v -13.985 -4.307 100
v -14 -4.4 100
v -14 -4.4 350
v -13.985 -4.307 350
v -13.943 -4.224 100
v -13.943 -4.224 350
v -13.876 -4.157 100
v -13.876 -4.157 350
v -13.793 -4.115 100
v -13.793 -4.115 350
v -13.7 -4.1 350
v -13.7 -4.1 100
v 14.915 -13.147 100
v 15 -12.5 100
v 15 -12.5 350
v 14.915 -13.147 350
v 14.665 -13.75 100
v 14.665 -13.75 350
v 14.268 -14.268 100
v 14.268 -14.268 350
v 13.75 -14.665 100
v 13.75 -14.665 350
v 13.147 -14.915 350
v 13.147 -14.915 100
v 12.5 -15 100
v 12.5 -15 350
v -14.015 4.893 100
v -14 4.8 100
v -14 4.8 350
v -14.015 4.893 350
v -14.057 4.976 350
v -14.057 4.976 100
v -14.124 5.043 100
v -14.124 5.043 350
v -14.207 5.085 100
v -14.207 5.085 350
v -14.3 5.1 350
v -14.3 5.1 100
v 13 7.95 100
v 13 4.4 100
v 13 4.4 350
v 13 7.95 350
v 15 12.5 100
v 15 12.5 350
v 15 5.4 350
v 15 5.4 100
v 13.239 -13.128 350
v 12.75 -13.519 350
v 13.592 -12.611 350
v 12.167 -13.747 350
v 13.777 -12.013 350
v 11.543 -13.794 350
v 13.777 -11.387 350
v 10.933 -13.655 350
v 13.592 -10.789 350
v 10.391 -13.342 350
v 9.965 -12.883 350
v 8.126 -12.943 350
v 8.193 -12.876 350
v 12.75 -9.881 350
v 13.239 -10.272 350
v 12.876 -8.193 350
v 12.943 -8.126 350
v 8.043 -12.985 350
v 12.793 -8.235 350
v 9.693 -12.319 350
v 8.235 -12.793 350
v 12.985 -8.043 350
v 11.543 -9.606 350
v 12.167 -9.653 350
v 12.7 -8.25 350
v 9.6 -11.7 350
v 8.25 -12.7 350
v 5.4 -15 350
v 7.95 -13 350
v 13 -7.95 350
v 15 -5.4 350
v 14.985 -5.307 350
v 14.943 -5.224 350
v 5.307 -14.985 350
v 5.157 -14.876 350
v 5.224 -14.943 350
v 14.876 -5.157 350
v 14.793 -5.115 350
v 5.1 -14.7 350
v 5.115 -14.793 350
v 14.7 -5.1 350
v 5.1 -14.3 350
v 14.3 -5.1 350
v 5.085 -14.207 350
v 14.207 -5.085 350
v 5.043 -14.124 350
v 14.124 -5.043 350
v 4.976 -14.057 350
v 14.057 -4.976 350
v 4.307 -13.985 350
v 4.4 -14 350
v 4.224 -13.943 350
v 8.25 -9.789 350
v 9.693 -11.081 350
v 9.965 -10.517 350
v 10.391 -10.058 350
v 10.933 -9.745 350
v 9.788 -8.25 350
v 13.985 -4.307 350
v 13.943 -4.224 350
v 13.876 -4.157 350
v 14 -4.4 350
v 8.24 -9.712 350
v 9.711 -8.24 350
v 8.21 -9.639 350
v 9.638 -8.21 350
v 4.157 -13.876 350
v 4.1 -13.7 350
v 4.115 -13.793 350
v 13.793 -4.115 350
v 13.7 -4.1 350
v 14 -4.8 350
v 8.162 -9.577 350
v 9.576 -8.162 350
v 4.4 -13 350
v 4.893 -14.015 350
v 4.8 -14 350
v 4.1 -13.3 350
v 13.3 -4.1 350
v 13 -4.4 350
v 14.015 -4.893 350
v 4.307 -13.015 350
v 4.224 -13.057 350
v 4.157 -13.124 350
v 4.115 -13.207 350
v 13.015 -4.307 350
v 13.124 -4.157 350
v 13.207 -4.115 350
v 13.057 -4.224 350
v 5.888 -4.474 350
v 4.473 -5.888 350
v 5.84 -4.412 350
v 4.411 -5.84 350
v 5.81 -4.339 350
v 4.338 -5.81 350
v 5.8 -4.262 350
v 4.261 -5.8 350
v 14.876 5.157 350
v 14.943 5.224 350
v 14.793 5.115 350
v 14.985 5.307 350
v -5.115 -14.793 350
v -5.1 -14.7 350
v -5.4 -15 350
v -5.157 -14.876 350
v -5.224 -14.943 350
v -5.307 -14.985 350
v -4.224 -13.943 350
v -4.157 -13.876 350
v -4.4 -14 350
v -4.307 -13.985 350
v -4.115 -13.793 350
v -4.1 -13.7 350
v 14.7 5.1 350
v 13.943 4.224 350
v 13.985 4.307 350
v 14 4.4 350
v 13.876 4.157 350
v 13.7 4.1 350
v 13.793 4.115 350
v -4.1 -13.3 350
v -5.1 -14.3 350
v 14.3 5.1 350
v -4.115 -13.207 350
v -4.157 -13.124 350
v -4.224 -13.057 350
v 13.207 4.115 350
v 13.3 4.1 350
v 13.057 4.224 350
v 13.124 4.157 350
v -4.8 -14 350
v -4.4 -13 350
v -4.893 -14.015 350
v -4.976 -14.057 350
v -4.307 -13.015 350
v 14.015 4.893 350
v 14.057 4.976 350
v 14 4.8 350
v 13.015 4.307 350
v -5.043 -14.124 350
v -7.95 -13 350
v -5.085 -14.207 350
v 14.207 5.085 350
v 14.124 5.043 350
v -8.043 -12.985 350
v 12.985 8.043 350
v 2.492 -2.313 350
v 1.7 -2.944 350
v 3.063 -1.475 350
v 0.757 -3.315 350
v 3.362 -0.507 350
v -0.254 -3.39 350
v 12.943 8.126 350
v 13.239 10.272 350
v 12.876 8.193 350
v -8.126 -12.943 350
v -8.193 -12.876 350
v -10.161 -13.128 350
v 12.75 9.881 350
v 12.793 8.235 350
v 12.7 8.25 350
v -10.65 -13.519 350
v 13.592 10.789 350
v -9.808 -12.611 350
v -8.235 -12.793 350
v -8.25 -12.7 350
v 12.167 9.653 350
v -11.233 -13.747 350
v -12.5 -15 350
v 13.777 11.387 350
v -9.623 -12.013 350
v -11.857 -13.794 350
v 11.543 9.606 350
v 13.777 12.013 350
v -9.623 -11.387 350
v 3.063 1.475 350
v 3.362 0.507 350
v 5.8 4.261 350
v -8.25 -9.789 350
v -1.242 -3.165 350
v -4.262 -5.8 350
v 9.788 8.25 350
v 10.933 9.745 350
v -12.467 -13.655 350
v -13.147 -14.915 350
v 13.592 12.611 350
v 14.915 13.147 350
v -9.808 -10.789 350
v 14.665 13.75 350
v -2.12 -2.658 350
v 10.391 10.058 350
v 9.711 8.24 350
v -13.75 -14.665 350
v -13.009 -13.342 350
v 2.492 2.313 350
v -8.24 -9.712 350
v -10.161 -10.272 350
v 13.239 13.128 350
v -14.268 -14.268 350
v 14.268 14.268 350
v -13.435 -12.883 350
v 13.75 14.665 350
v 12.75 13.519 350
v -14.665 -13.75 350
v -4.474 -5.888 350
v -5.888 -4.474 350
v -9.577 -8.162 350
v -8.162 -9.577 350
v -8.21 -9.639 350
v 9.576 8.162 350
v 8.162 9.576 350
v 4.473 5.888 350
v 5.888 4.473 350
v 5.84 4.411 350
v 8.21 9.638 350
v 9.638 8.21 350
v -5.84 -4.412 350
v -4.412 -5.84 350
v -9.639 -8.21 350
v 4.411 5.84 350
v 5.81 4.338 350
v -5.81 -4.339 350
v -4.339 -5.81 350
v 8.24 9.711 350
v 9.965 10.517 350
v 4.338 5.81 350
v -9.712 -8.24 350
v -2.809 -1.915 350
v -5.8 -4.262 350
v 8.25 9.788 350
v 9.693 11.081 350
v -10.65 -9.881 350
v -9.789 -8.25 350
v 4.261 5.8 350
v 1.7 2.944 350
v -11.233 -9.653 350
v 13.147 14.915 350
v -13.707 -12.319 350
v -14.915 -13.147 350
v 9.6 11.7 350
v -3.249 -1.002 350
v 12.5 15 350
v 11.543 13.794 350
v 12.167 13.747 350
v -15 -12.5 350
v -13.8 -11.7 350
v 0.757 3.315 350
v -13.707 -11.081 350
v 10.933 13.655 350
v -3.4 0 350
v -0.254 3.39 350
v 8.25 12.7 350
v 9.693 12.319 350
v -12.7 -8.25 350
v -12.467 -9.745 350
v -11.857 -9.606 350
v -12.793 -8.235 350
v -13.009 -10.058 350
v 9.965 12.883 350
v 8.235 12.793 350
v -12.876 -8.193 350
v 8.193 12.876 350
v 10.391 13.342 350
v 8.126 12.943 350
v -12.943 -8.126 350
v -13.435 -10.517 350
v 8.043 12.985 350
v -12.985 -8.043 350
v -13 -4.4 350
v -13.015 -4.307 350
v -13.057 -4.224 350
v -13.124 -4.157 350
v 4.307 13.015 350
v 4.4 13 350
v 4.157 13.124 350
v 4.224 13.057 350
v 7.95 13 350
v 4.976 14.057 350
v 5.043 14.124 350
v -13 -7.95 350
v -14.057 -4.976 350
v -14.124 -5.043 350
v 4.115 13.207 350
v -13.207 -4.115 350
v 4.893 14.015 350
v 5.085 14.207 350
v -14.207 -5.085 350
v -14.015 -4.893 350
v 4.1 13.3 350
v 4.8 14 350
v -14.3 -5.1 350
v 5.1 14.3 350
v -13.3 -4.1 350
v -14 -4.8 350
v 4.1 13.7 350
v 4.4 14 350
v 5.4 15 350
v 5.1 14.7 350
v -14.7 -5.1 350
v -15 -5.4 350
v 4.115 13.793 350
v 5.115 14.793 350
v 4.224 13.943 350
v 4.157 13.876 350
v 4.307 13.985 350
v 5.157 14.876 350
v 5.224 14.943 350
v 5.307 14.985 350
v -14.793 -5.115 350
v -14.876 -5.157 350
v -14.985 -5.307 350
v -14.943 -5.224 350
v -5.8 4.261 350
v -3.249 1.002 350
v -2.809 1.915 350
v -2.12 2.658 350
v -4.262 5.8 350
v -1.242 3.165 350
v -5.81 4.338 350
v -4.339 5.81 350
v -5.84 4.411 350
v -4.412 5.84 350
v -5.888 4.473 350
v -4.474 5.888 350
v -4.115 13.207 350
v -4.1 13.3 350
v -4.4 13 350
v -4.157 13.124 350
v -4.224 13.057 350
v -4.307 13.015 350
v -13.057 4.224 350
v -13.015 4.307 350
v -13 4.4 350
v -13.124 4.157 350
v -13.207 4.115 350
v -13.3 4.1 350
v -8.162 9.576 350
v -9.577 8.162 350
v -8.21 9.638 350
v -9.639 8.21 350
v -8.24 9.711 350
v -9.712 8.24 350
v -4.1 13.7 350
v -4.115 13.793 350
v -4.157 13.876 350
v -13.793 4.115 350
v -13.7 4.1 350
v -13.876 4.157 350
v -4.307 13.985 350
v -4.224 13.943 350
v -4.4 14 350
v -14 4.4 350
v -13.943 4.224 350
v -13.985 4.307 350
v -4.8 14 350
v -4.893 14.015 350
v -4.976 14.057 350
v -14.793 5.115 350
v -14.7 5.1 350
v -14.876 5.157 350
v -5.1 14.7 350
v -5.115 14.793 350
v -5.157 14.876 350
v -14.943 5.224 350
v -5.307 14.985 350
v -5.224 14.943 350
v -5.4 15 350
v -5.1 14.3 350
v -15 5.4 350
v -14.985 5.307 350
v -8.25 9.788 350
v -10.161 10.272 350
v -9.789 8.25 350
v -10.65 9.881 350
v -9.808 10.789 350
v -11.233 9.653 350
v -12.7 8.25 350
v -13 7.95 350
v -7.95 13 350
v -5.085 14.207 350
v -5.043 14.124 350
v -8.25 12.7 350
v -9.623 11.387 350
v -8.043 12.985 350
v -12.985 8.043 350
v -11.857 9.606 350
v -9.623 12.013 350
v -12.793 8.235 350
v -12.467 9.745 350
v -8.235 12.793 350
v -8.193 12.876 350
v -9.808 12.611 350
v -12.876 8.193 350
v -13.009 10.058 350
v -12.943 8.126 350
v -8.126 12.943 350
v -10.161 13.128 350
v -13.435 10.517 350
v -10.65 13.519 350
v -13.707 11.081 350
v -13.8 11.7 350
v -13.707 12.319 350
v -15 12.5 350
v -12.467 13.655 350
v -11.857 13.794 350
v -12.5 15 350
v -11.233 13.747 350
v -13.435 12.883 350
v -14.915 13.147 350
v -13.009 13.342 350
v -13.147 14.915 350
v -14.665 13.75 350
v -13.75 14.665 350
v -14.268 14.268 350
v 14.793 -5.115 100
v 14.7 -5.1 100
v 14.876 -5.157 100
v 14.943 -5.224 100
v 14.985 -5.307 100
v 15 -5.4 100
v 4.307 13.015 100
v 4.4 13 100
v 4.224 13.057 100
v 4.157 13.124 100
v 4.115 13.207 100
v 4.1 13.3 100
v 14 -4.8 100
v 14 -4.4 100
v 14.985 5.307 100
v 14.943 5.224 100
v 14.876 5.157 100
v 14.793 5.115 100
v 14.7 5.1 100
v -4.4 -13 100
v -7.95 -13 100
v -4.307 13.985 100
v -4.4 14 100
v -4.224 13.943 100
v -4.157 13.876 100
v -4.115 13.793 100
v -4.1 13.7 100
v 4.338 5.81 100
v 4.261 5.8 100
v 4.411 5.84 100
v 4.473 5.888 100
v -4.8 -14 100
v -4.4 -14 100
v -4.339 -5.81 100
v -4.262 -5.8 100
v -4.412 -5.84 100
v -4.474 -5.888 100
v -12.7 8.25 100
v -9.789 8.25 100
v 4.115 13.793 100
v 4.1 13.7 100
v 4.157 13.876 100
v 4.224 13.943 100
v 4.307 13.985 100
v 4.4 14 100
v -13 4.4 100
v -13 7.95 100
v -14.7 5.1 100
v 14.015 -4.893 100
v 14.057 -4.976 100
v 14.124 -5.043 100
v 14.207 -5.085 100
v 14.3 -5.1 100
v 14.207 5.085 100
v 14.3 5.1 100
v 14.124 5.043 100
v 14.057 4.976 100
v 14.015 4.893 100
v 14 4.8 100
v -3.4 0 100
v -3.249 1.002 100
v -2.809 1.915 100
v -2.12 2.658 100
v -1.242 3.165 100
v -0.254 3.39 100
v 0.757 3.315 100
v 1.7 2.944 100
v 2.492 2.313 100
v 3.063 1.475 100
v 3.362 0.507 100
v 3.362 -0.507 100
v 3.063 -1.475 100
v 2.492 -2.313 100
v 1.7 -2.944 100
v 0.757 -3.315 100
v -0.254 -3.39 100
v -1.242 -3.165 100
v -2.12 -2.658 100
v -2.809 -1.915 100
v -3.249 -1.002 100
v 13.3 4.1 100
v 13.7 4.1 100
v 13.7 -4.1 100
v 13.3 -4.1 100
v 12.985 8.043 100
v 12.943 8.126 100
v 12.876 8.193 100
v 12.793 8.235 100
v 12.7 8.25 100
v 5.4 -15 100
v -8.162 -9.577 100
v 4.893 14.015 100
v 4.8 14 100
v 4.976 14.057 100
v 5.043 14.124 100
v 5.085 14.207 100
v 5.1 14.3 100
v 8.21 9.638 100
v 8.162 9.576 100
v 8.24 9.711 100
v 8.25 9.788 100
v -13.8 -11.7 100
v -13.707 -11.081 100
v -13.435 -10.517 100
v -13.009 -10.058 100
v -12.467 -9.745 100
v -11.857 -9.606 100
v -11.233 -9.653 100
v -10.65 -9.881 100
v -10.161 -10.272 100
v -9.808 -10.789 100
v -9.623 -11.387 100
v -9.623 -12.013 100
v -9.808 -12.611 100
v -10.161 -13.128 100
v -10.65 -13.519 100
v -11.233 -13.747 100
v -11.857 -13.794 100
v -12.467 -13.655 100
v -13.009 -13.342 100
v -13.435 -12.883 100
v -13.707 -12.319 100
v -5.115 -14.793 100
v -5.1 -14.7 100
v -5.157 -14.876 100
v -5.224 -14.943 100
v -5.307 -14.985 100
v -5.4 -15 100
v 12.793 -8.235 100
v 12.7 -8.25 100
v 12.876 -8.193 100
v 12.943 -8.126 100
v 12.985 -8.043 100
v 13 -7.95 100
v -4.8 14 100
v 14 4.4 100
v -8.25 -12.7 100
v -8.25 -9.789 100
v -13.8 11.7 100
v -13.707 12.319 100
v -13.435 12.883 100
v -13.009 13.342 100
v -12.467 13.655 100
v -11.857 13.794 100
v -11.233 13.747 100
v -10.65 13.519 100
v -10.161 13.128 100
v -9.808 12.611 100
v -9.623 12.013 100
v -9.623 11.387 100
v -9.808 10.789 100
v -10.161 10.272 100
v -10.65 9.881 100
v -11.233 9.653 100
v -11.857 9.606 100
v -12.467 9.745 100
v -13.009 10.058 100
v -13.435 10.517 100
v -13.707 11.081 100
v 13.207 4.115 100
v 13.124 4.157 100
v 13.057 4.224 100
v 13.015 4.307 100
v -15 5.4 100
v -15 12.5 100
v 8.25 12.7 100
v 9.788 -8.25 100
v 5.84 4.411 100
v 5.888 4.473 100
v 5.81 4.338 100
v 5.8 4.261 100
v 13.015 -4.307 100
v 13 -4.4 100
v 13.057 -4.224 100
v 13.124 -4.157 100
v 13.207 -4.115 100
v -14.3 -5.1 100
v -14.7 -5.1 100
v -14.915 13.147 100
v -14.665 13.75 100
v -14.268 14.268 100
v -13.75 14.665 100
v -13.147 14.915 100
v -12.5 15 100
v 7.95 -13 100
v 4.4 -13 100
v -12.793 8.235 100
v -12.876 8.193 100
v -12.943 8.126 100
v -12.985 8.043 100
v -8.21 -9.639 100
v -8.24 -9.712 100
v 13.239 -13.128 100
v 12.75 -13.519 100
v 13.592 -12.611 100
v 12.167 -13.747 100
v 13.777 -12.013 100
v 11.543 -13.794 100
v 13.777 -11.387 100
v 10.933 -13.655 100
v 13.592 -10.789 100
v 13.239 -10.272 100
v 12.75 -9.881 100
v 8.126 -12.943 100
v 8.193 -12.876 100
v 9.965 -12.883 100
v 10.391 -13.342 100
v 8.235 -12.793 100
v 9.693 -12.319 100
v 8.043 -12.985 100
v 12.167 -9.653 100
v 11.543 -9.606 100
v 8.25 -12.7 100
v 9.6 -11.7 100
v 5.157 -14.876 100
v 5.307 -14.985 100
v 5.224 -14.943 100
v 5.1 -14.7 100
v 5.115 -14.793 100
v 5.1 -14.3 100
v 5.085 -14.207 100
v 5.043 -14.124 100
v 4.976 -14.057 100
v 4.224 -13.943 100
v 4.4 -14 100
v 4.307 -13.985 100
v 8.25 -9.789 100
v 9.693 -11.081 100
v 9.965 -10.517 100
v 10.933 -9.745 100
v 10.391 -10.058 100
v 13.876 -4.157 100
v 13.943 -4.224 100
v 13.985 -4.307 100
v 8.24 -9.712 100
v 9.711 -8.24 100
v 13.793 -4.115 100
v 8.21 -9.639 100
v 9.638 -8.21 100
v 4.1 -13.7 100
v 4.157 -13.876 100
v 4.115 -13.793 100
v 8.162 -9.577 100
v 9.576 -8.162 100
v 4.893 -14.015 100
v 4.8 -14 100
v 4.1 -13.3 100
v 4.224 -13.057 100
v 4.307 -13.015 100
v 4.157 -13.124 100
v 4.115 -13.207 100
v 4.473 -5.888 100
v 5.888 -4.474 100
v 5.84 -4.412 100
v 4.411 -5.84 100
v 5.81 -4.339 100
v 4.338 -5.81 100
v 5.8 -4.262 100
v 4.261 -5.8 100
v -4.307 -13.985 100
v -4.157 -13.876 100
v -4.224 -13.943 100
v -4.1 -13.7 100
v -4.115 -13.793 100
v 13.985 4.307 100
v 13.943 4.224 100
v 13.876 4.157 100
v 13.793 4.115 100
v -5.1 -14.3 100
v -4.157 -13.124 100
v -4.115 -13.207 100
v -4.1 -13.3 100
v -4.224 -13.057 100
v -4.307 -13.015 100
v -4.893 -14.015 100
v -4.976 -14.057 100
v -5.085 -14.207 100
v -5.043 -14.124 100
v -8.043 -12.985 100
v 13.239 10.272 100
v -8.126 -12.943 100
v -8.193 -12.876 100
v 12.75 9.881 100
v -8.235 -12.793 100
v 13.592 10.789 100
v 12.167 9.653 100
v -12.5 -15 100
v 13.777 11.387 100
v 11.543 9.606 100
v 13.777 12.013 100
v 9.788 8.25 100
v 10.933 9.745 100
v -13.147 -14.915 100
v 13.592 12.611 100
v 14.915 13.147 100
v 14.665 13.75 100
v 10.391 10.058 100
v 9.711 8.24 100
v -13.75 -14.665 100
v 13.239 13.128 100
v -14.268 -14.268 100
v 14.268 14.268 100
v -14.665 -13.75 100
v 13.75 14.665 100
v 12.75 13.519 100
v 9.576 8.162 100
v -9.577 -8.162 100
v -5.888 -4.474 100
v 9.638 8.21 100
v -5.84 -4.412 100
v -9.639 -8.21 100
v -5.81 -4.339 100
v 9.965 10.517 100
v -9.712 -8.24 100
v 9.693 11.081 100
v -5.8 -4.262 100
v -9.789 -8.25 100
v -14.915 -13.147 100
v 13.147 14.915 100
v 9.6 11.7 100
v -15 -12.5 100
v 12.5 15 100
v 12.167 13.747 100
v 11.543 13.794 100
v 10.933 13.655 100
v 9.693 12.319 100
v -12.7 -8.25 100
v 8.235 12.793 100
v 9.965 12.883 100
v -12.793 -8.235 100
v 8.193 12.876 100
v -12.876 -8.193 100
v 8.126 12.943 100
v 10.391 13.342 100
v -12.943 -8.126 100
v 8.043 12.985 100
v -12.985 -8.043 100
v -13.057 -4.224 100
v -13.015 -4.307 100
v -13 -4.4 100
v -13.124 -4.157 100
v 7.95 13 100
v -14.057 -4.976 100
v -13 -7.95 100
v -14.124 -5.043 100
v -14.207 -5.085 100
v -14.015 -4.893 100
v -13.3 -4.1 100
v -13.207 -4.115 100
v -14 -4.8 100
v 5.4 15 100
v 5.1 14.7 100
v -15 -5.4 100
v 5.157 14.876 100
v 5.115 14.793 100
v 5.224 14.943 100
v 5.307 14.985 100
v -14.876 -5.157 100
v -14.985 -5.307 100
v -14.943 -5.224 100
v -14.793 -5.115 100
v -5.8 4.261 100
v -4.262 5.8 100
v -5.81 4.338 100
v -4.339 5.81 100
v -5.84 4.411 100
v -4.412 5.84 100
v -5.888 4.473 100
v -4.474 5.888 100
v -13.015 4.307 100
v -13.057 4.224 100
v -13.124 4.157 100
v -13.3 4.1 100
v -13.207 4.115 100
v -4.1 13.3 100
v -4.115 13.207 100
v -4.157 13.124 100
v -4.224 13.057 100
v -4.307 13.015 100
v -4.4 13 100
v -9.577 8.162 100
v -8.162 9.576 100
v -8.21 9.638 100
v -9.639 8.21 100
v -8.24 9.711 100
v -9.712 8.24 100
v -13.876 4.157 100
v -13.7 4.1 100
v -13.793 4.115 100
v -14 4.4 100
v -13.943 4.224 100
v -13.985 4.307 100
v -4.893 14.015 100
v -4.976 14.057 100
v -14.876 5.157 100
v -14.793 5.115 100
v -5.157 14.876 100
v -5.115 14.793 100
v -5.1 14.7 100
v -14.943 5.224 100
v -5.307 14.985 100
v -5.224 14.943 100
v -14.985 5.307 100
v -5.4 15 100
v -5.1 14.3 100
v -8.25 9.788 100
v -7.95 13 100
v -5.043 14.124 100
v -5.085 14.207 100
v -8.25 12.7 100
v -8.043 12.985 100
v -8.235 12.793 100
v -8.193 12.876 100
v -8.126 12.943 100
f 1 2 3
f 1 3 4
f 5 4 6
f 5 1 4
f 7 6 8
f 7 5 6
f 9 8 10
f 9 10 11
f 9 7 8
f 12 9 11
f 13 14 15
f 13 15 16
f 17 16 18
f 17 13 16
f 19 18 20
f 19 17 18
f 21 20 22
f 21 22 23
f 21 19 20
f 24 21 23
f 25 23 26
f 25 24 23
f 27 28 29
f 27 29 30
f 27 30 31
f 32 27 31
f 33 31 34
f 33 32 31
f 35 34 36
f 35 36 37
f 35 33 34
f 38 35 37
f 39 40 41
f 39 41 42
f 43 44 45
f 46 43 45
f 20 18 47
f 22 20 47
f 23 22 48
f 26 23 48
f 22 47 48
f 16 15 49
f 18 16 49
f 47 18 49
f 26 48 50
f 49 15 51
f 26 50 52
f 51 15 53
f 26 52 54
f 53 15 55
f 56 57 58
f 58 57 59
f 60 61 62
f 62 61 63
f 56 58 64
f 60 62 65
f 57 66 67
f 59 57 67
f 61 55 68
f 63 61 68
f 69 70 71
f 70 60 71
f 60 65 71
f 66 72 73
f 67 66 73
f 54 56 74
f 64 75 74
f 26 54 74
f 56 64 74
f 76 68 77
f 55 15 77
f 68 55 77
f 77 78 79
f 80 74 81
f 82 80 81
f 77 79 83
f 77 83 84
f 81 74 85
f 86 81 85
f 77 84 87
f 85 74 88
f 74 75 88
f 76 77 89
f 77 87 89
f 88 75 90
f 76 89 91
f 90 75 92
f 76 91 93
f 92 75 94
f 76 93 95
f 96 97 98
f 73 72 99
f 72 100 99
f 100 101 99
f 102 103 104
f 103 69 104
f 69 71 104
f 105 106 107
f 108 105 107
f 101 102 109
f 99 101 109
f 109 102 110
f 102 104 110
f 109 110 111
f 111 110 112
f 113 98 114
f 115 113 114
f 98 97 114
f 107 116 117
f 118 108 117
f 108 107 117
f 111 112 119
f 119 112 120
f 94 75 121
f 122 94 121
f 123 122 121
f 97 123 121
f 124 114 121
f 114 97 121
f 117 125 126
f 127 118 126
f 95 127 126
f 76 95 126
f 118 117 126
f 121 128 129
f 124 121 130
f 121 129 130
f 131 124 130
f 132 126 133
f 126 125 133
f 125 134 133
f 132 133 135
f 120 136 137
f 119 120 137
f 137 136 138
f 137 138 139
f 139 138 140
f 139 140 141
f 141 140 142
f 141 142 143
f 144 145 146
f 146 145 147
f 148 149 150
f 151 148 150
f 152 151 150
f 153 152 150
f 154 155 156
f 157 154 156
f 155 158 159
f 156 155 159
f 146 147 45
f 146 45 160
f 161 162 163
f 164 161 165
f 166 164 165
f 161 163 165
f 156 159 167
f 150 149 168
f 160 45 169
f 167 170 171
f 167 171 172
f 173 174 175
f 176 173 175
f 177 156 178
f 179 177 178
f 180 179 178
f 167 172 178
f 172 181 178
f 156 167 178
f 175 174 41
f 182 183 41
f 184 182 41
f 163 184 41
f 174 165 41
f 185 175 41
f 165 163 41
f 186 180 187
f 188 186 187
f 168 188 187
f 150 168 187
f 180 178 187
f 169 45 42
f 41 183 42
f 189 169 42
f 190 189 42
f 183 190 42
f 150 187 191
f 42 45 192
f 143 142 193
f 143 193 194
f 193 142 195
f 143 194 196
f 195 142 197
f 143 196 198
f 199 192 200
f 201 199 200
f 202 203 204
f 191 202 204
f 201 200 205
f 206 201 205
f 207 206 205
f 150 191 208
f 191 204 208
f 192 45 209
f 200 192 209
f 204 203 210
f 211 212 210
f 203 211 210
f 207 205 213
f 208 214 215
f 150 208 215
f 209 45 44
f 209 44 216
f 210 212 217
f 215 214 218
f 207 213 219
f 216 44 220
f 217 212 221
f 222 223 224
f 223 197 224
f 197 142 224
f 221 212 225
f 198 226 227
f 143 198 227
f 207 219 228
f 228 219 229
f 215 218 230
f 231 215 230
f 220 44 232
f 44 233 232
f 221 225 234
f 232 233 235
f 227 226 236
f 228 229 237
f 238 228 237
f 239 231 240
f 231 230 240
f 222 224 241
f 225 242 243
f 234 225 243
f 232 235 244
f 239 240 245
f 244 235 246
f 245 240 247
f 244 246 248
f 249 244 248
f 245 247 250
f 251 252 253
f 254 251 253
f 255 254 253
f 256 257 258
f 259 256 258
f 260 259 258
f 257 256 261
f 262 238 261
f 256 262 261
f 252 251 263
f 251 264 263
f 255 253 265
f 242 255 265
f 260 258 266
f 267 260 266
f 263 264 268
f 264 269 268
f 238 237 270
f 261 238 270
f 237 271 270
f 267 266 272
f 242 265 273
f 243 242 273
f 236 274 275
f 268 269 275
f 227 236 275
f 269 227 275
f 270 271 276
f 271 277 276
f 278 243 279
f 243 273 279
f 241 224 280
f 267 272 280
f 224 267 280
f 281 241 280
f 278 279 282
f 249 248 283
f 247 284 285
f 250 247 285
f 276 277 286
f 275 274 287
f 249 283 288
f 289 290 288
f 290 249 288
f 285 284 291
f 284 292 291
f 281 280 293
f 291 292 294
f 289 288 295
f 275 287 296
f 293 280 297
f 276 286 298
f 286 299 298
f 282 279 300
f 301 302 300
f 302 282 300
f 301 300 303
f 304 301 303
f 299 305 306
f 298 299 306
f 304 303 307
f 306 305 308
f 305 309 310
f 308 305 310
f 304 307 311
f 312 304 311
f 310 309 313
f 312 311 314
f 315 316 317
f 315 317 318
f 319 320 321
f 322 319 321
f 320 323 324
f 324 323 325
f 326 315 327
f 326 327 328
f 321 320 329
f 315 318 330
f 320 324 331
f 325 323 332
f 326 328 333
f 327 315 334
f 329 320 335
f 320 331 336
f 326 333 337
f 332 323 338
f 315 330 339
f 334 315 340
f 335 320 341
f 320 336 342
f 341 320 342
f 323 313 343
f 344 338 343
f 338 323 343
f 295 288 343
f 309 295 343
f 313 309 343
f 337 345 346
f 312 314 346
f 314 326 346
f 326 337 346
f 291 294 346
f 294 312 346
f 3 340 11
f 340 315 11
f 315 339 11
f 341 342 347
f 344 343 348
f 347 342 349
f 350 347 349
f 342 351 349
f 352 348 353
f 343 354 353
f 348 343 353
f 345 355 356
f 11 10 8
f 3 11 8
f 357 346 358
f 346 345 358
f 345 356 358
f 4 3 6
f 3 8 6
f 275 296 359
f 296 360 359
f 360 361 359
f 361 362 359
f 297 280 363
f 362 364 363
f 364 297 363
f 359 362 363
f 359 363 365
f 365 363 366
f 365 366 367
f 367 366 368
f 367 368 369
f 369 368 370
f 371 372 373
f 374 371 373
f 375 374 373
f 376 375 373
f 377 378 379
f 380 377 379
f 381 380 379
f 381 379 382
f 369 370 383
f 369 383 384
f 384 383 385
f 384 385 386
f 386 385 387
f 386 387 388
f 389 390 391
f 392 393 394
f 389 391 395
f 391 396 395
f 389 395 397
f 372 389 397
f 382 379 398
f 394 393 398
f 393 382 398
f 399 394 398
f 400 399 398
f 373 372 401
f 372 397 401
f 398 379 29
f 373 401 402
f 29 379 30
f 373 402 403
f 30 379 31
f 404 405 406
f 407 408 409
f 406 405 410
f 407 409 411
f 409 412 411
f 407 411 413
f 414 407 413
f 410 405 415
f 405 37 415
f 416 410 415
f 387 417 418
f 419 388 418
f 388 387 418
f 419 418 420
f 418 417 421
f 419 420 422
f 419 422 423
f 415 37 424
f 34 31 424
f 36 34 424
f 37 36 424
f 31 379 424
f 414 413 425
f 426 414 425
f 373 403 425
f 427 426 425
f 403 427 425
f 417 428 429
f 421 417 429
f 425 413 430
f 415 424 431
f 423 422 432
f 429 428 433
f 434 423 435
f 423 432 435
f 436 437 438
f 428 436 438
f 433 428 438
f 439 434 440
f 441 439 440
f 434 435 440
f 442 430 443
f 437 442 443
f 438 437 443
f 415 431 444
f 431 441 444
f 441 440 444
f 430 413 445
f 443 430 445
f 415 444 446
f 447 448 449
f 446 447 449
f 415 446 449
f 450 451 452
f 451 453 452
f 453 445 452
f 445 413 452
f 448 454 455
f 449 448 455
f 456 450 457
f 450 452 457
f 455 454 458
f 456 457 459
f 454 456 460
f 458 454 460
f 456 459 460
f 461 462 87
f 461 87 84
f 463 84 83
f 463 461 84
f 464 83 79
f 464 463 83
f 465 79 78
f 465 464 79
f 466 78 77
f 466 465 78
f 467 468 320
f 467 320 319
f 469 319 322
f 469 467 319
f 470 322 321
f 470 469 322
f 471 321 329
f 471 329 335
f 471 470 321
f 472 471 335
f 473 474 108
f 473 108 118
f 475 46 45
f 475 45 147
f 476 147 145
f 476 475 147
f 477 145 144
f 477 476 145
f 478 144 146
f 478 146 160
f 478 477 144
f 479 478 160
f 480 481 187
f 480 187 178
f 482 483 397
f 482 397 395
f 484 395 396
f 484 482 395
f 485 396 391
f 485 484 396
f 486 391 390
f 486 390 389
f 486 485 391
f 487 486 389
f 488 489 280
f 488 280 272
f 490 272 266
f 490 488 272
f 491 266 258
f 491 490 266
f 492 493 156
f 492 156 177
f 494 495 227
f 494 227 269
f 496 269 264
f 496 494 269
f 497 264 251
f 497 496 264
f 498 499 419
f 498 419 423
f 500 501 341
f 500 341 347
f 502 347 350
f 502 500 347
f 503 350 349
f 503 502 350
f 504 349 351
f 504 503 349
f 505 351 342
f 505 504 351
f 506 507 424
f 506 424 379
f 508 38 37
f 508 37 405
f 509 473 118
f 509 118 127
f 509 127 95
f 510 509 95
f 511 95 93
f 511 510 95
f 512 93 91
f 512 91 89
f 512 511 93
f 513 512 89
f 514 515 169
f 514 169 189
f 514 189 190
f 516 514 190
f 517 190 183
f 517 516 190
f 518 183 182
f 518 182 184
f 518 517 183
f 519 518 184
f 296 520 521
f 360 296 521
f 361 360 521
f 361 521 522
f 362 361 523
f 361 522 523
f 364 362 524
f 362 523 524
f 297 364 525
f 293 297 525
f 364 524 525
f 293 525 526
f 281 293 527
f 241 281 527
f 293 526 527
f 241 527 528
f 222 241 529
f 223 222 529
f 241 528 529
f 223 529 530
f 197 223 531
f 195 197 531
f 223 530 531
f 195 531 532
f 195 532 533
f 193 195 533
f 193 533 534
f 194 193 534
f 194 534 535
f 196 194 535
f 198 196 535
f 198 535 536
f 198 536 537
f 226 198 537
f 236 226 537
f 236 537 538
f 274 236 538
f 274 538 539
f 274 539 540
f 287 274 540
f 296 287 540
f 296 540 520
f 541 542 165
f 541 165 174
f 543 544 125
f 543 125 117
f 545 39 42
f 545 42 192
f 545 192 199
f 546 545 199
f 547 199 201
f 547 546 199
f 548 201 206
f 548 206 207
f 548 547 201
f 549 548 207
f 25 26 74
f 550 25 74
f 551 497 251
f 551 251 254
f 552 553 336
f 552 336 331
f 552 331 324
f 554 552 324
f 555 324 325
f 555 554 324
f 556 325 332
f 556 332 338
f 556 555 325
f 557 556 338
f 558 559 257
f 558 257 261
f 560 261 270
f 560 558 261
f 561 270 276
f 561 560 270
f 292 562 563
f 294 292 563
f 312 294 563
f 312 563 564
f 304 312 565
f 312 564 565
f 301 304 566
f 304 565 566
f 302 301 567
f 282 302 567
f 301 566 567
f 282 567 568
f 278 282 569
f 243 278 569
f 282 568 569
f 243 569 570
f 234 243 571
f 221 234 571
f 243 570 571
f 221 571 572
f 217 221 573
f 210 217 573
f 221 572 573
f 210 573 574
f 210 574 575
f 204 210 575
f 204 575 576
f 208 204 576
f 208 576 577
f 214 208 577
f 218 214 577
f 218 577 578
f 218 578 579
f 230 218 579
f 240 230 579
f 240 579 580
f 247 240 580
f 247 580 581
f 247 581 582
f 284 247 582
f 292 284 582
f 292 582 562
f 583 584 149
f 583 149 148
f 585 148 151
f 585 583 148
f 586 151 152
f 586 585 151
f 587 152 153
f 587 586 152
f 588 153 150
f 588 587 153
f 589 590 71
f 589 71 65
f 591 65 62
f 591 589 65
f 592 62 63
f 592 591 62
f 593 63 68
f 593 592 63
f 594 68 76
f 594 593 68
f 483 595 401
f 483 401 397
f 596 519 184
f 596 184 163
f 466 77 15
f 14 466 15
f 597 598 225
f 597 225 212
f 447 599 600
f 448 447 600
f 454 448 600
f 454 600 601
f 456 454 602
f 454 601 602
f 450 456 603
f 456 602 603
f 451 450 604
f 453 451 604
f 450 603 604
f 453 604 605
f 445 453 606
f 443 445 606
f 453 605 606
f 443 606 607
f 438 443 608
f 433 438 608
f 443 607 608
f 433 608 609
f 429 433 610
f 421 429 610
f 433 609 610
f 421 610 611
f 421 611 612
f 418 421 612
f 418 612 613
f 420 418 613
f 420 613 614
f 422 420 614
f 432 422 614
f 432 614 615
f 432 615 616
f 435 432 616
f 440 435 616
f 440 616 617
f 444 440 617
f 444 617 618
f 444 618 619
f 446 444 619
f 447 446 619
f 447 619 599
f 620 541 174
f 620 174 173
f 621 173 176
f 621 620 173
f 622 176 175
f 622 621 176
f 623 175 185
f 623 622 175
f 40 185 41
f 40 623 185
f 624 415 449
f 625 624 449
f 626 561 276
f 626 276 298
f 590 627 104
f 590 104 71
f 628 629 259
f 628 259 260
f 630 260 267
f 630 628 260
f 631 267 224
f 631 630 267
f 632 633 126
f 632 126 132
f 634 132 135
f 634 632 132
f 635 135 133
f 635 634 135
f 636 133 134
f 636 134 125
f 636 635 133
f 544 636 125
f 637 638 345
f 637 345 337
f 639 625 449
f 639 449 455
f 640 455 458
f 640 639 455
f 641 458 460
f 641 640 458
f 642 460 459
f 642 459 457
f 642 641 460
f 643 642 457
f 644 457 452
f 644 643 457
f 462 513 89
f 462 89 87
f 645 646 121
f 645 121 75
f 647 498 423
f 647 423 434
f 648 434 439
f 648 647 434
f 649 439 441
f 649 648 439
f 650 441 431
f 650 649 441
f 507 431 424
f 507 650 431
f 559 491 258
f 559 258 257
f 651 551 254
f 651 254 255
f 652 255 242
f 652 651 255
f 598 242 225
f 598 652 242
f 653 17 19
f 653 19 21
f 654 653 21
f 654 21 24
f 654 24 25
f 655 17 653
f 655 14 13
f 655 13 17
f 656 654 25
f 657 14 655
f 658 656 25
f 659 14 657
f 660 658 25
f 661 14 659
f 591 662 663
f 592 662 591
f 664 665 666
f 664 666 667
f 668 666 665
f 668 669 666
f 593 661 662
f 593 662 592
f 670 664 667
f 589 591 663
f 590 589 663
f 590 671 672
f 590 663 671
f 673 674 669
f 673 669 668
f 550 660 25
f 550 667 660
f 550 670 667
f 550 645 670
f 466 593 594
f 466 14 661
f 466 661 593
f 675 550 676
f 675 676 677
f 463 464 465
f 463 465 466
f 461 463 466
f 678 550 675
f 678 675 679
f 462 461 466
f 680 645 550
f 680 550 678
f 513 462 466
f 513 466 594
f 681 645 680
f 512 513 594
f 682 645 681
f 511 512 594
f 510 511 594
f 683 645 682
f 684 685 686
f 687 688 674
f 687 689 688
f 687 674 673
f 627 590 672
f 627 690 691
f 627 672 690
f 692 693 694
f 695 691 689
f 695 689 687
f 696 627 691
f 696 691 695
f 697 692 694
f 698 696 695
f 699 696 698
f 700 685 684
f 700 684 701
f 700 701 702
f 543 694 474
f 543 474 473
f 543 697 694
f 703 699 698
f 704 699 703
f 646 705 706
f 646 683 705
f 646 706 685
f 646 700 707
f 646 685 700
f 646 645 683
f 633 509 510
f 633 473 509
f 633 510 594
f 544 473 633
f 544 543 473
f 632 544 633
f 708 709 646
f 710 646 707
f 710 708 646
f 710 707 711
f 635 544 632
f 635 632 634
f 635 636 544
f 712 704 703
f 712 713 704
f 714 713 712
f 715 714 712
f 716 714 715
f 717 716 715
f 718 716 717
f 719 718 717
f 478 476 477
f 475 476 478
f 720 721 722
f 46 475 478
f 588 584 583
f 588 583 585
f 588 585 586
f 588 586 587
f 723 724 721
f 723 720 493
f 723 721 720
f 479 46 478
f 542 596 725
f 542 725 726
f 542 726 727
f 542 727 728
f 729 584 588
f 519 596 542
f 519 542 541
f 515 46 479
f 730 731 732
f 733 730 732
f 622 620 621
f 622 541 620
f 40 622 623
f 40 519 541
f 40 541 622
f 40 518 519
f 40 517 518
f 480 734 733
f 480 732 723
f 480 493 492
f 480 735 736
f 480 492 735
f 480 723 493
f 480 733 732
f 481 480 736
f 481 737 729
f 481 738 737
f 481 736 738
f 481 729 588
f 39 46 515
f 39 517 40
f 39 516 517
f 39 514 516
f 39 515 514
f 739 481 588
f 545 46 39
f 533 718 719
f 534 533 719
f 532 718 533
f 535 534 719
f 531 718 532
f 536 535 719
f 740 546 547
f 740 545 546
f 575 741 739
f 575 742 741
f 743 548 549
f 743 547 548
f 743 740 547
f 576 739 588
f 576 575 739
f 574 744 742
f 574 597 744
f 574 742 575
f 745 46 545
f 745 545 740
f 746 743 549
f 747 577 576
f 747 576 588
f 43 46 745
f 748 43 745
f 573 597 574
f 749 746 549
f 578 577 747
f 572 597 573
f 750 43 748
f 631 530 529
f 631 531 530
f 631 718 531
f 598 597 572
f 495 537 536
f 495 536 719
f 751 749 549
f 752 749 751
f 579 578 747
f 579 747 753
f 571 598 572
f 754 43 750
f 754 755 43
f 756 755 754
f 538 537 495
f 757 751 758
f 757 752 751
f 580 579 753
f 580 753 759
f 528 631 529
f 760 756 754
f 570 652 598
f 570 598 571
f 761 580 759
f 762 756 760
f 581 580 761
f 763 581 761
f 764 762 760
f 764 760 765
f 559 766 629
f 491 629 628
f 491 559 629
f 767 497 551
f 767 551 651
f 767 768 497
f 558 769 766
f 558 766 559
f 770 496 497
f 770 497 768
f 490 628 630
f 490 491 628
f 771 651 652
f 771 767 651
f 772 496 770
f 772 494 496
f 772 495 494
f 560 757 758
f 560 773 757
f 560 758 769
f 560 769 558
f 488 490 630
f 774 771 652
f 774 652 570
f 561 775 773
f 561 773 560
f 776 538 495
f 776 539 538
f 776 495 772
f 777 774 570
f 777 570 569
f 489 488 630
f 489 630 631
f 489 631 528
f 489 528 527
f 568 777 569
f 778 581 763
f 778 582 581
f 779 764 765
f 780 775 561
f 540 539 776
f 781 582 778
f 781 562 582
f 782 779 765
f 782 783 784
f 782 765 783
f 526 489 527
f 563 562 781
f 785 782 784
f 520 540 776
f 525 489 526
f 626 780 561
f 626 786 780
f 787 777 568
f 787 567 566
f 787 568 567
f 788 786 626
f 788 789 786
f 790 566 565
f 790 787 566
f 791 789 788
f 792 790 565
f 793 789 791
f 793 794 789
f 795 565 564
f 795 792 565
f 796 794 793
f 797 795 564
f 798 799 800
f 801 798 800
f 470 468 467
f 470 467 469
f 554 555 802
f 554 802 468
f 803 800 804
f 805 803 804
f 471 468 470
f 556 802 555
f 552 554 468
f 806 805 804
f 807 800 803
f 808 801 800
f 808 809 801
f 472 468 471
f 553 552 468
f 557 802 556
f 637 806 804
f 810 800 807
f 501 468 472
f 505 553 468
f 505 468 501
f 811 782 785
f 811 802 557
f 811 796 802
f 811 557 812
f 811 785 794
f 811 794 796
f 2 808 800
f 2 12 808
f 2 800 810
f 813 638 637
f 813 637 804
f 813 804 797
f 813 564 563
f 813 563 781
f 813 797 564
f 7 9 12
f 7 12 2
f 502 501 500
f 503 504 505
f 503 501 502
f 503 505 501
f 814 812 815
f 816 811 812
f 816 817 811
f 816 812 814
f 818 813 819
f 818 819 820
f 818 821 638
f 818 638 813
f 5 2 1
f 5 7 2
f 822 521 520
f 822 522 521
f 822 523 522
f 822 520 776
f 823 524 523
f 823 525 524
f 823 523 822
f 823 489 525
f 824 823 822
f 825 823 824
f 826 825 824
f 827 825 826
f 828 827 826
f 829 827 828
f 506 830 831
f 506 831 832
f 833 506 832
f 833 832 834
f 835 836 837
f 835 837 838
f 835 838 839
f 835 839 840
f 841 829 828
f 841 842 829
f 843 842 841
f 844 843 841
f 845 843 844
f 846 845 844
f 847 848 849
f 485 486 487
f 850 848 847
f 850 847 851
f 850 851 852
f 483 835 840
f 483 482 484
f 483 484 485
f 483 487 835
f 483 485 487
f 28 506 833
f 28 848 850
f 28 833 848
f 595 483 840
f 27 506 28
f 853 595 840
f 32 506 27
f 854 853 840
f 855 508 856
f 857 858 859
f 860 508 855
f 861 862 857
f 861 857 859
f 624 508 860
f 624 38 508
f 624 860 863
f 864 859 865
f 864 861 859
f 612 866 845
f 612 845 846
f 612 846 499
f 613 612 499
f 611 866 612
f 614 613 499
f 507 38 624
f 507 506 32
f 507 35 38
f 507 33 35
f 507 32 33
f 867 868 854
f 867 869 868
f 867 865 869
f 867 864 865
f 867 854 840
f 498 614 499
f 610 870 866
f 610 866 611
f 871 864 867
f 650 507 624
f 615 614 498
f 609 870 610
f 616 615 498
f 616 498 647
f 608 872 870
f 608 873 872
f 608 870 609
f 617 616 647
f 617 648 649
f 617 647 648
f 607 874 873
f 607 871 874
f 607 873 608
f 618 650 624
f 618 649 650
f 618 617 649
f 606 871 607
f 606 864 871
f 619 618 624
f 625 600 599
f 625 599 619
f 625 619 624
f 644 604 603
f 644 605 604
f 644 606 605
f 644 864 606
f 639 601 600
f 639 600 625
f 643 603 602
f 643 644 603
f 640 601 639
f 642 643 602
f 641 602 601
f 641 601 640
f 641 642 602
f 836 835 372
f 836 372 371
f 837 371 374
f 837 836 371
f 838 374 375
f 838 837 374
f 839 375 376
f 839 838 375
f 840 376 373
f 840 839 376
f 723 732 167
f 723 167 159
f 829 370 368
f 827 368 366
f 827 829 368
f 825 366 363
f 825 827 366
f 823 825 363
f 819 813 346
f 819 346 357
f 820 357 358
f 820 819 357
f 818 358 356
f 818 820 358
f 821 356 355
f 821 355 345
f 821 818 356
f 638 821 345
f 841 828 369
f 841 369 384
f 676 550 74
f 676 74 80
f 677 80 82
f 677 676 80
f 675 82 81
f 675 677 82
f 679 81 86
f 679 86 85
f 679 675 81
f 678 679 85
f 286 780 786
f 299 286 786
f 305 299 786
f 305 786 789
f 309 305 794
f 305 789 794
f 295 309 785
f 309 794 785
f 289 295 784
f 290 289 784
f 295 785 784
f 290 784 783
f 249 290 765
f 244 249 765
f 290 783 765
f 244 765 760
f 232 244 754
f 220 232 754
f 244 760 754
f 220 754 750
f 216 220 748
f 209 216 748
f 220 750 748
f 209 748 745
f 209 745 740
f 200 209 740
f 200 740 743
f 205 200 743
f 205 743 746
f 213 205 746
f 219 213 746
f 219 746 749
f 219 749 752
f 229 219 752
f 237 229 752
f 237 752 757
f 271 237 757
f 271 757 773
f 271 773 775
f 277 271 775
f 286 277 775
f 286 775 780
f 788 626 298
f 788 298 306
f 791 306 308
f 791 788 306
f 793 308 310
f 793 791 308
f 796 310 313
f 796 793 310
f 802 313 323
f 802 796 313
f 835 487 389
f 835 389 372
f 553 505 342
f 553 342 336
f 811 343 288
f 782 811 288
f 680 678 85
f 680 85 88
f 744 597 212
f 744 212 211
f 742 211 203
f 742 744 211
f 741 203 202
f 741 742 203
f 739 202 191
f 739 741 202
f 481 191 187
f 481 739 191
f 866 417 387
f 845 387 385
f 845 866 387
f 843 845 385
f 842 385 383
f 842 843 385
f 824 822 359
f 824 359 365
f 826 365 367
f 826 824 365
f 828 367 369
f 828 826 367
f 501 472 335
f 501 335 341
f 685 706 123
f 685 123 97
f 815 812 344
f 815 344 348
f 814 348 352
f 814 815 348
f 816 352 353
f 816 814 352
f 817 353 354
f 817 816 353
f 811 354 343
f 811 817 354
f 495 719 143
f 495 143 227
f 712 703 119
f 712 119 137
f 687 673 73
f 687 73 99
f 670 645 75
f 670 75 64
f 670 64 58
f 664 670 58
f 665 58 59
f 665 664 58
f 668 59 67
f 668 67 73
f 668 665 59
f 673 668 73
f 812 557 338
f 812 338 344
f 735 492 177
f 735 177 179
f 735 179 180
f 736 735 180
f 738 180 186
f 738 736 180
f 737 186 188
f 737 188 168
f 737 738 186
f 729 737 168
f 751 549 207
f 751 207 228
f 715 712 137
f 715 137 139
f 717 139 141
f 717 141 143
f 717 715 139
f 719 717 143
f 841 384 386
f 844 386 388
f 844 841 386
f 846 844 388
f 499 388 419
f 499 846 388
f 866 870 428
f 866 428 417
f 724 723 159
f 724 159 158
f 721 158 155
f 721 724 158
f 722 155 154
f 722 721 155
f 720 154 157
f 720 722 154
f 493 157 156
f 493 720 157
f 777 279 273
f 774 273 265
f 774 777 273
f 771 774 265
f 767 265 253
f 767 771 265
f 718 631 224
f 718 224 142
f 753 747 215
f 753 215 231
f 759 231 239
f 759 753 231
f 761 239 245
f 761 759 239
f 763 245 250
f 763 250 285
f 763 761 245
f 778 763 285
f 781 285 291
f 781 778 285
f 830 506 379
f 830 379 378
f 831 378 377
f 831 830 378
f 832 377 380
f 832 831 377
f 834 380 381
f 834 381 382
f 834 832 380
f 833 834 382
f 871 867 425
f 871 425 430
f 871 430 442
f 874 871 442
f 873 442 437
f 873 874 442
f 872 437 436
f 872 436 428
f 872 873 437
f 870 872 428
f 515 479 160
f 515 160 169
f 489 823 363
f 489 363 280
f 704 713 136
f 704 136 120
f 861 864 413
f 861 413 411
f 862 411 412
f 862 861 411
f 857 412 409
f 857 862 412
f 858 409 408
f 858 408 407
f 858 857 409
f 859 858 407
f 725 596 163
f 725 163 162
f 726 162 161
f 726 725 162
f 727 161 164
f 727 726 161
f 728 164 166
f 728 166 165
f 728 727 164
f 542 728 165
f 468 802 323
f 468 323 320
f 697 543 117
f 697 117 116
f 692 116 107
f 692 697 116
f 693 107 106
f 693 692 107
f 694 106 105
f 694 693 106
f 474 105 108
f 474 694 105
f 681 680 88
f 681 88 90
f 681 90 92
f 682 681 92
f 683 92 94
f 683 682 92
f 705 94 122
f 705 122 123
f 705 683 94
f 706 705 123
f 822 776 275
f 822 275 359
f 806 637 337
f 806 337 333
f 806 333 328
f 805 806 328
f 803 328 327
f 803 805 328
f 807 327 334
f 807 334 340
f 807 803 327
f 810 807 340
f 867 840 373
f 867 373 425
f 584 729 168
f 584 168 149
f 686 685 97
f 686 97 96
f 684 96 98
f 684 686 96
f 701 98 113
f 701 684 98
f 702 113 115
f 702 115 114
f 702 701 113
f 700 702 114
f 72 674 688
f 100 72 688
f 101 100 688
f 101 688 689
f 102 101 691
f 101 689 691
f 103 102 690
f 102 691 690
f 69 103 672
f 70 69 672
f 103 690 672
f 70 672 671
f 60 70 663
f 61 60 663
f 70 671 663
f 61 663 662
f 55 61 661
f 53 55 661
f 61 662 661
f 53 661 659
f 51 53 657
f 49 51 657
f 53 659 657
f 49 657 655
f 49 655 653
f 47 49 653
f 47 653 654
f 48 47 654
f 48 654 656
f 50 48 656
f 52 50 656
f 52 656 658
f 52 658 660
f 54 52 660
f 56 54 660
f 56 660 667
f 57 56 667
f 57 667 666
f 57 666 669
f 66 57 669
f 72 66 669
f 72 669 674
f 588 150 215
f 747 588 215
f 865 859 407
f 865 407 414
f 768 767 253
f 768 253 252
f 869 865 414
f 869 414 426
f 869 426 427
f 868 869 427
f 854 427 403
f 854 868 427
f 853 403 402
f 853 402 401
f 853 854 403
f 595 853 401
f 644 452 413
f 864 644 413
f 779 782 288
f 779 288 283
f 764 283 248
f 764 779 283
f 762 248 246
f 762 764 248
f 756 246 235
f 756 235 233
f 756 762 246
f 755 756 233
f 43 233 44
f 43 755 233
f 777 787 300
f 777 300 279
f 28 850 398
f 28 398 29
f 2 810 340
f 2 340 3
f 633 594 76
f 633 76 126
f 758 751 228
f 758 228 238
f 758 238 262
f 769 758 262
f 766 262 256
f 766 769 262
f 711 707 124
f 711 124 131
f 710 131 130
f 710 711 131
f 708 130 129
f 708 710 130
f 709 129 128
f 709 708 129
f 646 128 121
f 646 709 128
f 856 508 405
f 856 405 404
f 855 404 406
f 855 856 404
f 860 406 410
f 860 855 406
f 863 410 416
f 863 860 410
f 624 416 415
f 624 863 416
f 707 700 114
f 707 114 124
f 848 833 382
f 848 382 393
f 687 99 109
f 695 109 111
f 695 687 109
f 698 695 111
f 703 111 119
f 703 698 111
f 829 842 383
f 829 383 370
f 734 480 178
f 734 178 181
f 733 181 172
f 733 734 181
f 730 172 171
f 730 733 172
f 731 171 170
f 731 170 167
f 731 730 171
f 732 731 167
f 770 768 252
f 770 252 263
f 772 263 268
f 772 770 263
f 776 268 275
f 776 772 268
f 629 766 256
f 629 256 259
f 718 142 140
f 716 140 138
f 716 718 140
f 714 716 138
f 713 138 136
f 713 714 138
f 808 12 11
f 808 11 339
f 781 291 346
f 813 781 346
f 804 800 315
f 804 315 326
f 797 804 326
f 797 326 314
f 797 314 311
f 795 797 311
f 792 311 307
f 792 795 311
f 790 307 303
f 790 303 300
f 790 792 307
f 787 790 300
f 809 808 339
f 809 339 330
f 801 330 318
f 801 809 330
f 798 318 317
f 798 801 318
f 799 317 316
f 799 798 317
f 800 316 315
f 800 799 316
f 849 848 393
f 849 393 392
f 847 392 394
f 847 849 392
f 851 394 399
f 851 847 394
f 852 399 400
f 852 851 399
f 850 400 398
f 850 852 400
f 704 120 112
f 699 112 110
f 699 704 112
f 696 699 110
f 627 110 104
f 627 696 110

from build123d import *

# Parameters (mm, degrees)
CROQUIS1_R              = 2.1
CROQUIS1_R_2            = 3.4
SALIENTE_EXTRUIR1_DEPTH = 400
CROQUIS3_W              = 36.891585518
CROQUIS3_H              = 31.857253434
CORTAR_EXTRUIR2_DEPTH   = 150


with BuildPart() as part:
    # Croquis1 → Saliente-Extruir1 (new body)
    with BuildSketch(Plane(origin=(0, 0, -50), x_dir=(-1, 0, 0), z_dir=(0, 0, -1))):
        with BuildLine():
            Line((14.7, -5.1), (14.3, -5.1))
            ThreePointArc((14.3, -5.1), (14.087867966, -5.012132034), (14, -4.8))
            Line((14, -4.8), (14, -4.4))
            ThreePointArc((14, -4.4), (13.912132034, -4.187867966), (13.7, -4.1))
            Line((13.7, -4.1), (13.3, -4.1))
            ThreePointArc((13.3, -4.1), (13.087867966, -4.187867966), (13, -4.4))
            Line((13, -4.4), (13, -7.95))
            ThreePointArc((13, -7.95), (12.912132034, -8.162132034), (12.7, -8.25))
            Line((12.7, -8.25), (9.789264108, -8.25))
            ThreePointArc((9.789264108, -8.25), (9.674477865, -8.22717164), (9.577160832, -8.162160788))
            Line((9.577160832, -8.162160788), (5.887896723, -4.473896751))
            ThreePointArc((5.887896723, -4.473896751), (5.822843922, -4.376559778), (5.8, -4.261735963))
            Line((5.8, -4.261735963), (5.8, 4.260735931))
            ThreePointArc((5.8, 4.260735931), (5.82283614, 4.375540961), (5.887867966, 4.472867966))
            Line((5.887867966, 4.472867966), (9.577132034, 8.162132034))
            ThreePointArc((9.577132034, 8.162132034), (9.674459039, 8.22716386), (9.789264069, 8.25))
            Line((9.789264069, 8.25), (12.7, 8.25))
            ThreePointArc((12.7, 8.25), (12.912132034, 8.162132034), (13, 7.95))
            Line((13, 7.95), (13, 4.4))
            ThreePointArc((13, 4.4), (13.087867966, 4.187867966), (13.3, 4.1))
            Line((13.3, 4.1), (13.7, 4.1))
            ThreePointArc((13.7, 4.1), (13.912132034, 4.187867966), (14, 4.4))
            Line((14, 4.4), (14, 4.8))
            ThreePointArc((14, 4.8), (14.087867966, 5.012132034), (14.3, 5.1))
            Line((14.3, 5.1), (14.7, 5.1))
            ThreePointArc((14.7, 5.1), (14.912132034, 5.187867966), (15, 5.4))
            Line((15, 5.4), (15, 12.5))
            ThreePointArc((15, 12.5), (14.267766953, 14.267766953), (12.5, 15))
            Line((12.5, 15), (5.4, 15))
            ThreePointArc((5.4, 15), (5.187867966, 14.912132034), (5.1, 14.7))
            Line((5.1, 14.7), (5.1, 14.3))
            ThreePointArc((5.1, 14.3), (5.012132034, 14.087867966), (4.8, 14))
            Line((4.8, 14), (4.4, 14))
            ThreePointArc((4.4, 14), (4.187867966, 13.912132034), (4.1, 13.7))
            Line((4.1, 13.7), (4.1, 13.3))
            ThreePointArc((4.1, 13.3), (4.187867966, 13.087867966), (4.4, 13))
            Line((4.4, 13), (7.95, 13))
            ThreePointArc((7.95, 13), (8.162132034, 12.912132034), (8.25, 12.7))
            Line((8.25, 12.7), (8.25, 9.788264069))
            ThreePointArc((8.25, 9.788264069), (8.22716386, 9.673459039), (8.162132034, 9.576132034))
            Line((8.162132034, 9.576132034), (4.473867966, 5.887867966))
            ThreePointArc((4.473867966, 5.887867966), (4.376540961, 5.82283614), (4.261735931, 5.8))
            Line((4.261735931, 5.8), (-4.260735892, 5.8))
            ThreePointArc((-4.260735892, 5.8), (-4.375522135, 5.82282836), (-4.472839168, 5.887839212))
            Line((-4.472839168, 5.887839212), (-8.162103277, 9.576103249))
            ThreePointArc((-8.162103277, 9.576103249), (-8.227156078, 9.673440222), (-8.25, 9.788264037))
            Line((-8.25, 9.788264037), (-8.25, 12.7))
            ThreePointArc((-8.25, 12.7), (-8.162132034, 12.912132034), (-7.95, 13))
            Line((-7.95, 13), (-4.4, 13))
            ThreePointArc((-4.4, 13), (-4.187867966, 13.087867966), (-4.1, 13.3))
            Line((-4.1, 13.3), (-4.1, 13.7))
            ThreePointArc((-4.1, 13.7), (-4.187867966, 13.912132034), (-4.4, 14))
            Line((-4.4, 14), (-4.8, 14))
            ThreePointArc((-4.8, 14), (-5.012132034, 14.087867966), (-5.1, 14.3))
            Line((-5.1, 14.3), (-5.1, 14.7))
            ThreePointArc((-5.1, 14.7), (-5.187867966, 14.912132034), (-5.4, 15))
            Line((-5.4, 15), (-12.5, 15))
            ThreePointArc((-12.5, 15), (-14.267766953, 14.267766953), (-15, 12.5))
            Line((-15, 12.5), (-15, 5.4))
            ThreePointArc((-15, 5.4), (-14.912132034, 5.187867966), (-14.7, 5.1))
            Line((-14.7, 5.1), (-14.3, 5.1))
            ThreePointArc((-14.3, 5.1), (-14.087867966, 5.012132034), (-14, 4.8))
            Line((-14, 4.8), (-14, 4.4))
            ThreePointArc((-14, 4.4), (-13.912132034, 4.187867966), (-13.7, 4.1))
            Line((-13.7, 4.1), (-13.3, 4.1))
            ThreePointArc((-13.3, 4.1), (-13.087867966, 4.187867966), (-13, 4.4))
            Line((-13, 4.4), (-13, 7.95))
            ThreePointArc((-13, 7.95), (-12.912132034, 8.162132034), (-12.7, 8.25))
            Line((-12.7, 8.25), (-9.788264037, 8.25))
            ThreePointArc((-9.788264037, 8.25), (-9.673440222, 8.227156078), (-9.576103249, 8.162103277))
            Line((-9.576103249, 8.162103277), (-5.887839212, 4.472839168))
            ThreePointArc((-5.887839212, 4.472839168), (-5.82282836, 4.375522135), (-5.8, 4.260735892))
            Line((-5.8, 4.260735892), (-5.8, -4.261735931))
            ThreePointArc((-5.8, -4.261735931), (-5.82283614, -4.376540961), (-5.887867966, -4.473867966))
            Line((-5.887867966, -4.473867966), (-9.576132034, -8.162132034))
            ThreePointArc((-9.576132034, -8.162132034), (-9.673459039, -8.22716386), (-9.788264069, -8.25))
            Line((-9.788264069, -8.25), (-12.7, -8.25))
            ThreePointArc((-12.7, -8.25), (-12.912132034, -8.162132034), (-13, -7.95))
            Line((-13, -7.95), (-13, -4.4))
            ThreePointArc((-13, -4.4), (-13.087867966, -4.187867966), (-13.3, -4.1))
            Line((-13.3, -4.1), (-13.7, -4.1))
            ThreePointArc((-13.7, -4.1), (-13.912132034, -4.187867966), (-14, -4.4))
            Line((-14, -4.4), (-14, -4.8))
            ThreePointArc((-14, -4.8), (-14.087867966, -5.012132034), (-14.3, -5.1))
            Line((-14.3, -5.1), (-14.7, -5.1))
            ThreePointArc((-14.7, -5.1), (-14.912132034, -5.187867966), (-15, -5.4))
            Line((-15, -5.4), (-15, -12.5))
            ThreePointArc((-15, -12.5), (-14.267766953, -14.267766953), (-12.5, -15))
            Line((-12.5, -15), (-5.4, -15))
            ThreePointArc((-5.4, -15), (-5.187867966, -14.912132034), (-5.1, -14.7))
            Line((-5.1, -14.7), (-5.1, -14.3))
            ThreePointArc((-5.1, -14.3), (-5.012132034, -14.087867966), (-4.8, -14))
            Line((-4.8, -14), (-4.4, -14))
            ThreePointArc((-4.4, -14), (-4.187867966, -13.912132034), (-4.1, -13.7))
            Line((-4.1, -13.7), (-4.1, -13.3))
            ThreePointArc((-4.1, -13.3), (-4.187867966, -13.087867966), (-4.4, -13))
            Line((-4.4, -13), (-7.95, -13))
            ThreePointArc((-7.95, -13), (-8.162132034, -12.912132034), (-8.25, -12.7))
            Line((-8.25, -12.7), (-8.25, -9.789264069))
            ThreePointArc((-8.25, -9.789264069), (-8.22716386, -9.674459039), (-8.162132034, -9.577132034))
            Line((-8.162132034, -9.577132034), (-4.472867966, -5.887867966))
            ThreePointArc((-4.472867966, -5.887867966), (-4.375540961, -5.82283614), (-4.260735931, -5.8))
            Line((-4.260735931, -5.8), (4.261735963, -5.8))
            ThreePointArc((4.261735963, -5.8), (4.376559778, -5.822843922), (4.473896751, -5.887896723))
            Line((4.473896751, -5.887896723), (8.162160788, -9.577160832))
            ThreePointArc((8.162160788, -9.577160832), (8.22717164, -9.674477865), (8.25, -9.789264108))
            Line((8.25, -9.789264108), (8.25, -12.7))
            ThreePointArc((8.25, -12.7), (8.162132034, -12.912132034), (7.95, -13))
            Line((7.95, -13), (4.4, -13))
            ThreePointArc((4.4, -13), (4.187867966, -13.087867966), (4.1, -13.3))
            Line((4.1, -13.3), (4.1, -13.7))
            ThreePointArc((4.1, -13.7), (4.187867966, -13.912132034), (4.4, -14))
            Line((4.4, -14), (4.8, -14))
            ThreePointArc((4.8, -14), (5.012132034, -14.087867966), (5.1, -14.3))
            Line((5.1, -14.3), (5.1, -14.7))
            ThreePointArc((5.1, -14.7), (5.187867966, -14.912132034), (5.4, -15))
            Line((5.4, -15), (12.5, -15))
            ThreePointArc((12.5, -15), (14.267766953, -14.267766953), (15, -12.5))
            Line((15, -12.5), (15, -5.4))
            ThreePointArc((15, -5.4), (14.912132034, -5.187867966), (14.7, -5.1))
        make_face()
        with Locations((-11.7, 11.7)):
            Circle(CROQUIS1_R, mode=Mode.SUBTRACT)
        with Locations((-11.7, -11.7)):
            Circle(CROQUIS1_R, mode=Mode.SUBTRACT)
        Circle(CROQUIS1_R_2, mode=Mode.SUBTRACT)
        with Locations((11.7, 11.7)):
            Circle(CROQUIS1_R, mode=Mode.SUBTRACT)
        with Locations((11.7, -11.7)):
            Circle(CROQUIS1_R, mode=Mode.SUBTRACT)
    extrude(amount=-SALIENTE_EXTRUIR1_DEPTH)

    # Croquis3 → Cortar-Extruir2 (cut)
    with BuildSketch(Plane(origin=(0, 0, -50), x_dir=(-1, 0, 0), z_dir=(0, 0, -1))):
        with Locations((0.583982522, 0.302059925)):
            Rectangle(CROQUIS3_W, CROQUIS3_H)
    extrude(amount=-CORTAR_EXTRUIR2_DEPTH, mode=Mode.SUBTRACT)


solid = part.part
